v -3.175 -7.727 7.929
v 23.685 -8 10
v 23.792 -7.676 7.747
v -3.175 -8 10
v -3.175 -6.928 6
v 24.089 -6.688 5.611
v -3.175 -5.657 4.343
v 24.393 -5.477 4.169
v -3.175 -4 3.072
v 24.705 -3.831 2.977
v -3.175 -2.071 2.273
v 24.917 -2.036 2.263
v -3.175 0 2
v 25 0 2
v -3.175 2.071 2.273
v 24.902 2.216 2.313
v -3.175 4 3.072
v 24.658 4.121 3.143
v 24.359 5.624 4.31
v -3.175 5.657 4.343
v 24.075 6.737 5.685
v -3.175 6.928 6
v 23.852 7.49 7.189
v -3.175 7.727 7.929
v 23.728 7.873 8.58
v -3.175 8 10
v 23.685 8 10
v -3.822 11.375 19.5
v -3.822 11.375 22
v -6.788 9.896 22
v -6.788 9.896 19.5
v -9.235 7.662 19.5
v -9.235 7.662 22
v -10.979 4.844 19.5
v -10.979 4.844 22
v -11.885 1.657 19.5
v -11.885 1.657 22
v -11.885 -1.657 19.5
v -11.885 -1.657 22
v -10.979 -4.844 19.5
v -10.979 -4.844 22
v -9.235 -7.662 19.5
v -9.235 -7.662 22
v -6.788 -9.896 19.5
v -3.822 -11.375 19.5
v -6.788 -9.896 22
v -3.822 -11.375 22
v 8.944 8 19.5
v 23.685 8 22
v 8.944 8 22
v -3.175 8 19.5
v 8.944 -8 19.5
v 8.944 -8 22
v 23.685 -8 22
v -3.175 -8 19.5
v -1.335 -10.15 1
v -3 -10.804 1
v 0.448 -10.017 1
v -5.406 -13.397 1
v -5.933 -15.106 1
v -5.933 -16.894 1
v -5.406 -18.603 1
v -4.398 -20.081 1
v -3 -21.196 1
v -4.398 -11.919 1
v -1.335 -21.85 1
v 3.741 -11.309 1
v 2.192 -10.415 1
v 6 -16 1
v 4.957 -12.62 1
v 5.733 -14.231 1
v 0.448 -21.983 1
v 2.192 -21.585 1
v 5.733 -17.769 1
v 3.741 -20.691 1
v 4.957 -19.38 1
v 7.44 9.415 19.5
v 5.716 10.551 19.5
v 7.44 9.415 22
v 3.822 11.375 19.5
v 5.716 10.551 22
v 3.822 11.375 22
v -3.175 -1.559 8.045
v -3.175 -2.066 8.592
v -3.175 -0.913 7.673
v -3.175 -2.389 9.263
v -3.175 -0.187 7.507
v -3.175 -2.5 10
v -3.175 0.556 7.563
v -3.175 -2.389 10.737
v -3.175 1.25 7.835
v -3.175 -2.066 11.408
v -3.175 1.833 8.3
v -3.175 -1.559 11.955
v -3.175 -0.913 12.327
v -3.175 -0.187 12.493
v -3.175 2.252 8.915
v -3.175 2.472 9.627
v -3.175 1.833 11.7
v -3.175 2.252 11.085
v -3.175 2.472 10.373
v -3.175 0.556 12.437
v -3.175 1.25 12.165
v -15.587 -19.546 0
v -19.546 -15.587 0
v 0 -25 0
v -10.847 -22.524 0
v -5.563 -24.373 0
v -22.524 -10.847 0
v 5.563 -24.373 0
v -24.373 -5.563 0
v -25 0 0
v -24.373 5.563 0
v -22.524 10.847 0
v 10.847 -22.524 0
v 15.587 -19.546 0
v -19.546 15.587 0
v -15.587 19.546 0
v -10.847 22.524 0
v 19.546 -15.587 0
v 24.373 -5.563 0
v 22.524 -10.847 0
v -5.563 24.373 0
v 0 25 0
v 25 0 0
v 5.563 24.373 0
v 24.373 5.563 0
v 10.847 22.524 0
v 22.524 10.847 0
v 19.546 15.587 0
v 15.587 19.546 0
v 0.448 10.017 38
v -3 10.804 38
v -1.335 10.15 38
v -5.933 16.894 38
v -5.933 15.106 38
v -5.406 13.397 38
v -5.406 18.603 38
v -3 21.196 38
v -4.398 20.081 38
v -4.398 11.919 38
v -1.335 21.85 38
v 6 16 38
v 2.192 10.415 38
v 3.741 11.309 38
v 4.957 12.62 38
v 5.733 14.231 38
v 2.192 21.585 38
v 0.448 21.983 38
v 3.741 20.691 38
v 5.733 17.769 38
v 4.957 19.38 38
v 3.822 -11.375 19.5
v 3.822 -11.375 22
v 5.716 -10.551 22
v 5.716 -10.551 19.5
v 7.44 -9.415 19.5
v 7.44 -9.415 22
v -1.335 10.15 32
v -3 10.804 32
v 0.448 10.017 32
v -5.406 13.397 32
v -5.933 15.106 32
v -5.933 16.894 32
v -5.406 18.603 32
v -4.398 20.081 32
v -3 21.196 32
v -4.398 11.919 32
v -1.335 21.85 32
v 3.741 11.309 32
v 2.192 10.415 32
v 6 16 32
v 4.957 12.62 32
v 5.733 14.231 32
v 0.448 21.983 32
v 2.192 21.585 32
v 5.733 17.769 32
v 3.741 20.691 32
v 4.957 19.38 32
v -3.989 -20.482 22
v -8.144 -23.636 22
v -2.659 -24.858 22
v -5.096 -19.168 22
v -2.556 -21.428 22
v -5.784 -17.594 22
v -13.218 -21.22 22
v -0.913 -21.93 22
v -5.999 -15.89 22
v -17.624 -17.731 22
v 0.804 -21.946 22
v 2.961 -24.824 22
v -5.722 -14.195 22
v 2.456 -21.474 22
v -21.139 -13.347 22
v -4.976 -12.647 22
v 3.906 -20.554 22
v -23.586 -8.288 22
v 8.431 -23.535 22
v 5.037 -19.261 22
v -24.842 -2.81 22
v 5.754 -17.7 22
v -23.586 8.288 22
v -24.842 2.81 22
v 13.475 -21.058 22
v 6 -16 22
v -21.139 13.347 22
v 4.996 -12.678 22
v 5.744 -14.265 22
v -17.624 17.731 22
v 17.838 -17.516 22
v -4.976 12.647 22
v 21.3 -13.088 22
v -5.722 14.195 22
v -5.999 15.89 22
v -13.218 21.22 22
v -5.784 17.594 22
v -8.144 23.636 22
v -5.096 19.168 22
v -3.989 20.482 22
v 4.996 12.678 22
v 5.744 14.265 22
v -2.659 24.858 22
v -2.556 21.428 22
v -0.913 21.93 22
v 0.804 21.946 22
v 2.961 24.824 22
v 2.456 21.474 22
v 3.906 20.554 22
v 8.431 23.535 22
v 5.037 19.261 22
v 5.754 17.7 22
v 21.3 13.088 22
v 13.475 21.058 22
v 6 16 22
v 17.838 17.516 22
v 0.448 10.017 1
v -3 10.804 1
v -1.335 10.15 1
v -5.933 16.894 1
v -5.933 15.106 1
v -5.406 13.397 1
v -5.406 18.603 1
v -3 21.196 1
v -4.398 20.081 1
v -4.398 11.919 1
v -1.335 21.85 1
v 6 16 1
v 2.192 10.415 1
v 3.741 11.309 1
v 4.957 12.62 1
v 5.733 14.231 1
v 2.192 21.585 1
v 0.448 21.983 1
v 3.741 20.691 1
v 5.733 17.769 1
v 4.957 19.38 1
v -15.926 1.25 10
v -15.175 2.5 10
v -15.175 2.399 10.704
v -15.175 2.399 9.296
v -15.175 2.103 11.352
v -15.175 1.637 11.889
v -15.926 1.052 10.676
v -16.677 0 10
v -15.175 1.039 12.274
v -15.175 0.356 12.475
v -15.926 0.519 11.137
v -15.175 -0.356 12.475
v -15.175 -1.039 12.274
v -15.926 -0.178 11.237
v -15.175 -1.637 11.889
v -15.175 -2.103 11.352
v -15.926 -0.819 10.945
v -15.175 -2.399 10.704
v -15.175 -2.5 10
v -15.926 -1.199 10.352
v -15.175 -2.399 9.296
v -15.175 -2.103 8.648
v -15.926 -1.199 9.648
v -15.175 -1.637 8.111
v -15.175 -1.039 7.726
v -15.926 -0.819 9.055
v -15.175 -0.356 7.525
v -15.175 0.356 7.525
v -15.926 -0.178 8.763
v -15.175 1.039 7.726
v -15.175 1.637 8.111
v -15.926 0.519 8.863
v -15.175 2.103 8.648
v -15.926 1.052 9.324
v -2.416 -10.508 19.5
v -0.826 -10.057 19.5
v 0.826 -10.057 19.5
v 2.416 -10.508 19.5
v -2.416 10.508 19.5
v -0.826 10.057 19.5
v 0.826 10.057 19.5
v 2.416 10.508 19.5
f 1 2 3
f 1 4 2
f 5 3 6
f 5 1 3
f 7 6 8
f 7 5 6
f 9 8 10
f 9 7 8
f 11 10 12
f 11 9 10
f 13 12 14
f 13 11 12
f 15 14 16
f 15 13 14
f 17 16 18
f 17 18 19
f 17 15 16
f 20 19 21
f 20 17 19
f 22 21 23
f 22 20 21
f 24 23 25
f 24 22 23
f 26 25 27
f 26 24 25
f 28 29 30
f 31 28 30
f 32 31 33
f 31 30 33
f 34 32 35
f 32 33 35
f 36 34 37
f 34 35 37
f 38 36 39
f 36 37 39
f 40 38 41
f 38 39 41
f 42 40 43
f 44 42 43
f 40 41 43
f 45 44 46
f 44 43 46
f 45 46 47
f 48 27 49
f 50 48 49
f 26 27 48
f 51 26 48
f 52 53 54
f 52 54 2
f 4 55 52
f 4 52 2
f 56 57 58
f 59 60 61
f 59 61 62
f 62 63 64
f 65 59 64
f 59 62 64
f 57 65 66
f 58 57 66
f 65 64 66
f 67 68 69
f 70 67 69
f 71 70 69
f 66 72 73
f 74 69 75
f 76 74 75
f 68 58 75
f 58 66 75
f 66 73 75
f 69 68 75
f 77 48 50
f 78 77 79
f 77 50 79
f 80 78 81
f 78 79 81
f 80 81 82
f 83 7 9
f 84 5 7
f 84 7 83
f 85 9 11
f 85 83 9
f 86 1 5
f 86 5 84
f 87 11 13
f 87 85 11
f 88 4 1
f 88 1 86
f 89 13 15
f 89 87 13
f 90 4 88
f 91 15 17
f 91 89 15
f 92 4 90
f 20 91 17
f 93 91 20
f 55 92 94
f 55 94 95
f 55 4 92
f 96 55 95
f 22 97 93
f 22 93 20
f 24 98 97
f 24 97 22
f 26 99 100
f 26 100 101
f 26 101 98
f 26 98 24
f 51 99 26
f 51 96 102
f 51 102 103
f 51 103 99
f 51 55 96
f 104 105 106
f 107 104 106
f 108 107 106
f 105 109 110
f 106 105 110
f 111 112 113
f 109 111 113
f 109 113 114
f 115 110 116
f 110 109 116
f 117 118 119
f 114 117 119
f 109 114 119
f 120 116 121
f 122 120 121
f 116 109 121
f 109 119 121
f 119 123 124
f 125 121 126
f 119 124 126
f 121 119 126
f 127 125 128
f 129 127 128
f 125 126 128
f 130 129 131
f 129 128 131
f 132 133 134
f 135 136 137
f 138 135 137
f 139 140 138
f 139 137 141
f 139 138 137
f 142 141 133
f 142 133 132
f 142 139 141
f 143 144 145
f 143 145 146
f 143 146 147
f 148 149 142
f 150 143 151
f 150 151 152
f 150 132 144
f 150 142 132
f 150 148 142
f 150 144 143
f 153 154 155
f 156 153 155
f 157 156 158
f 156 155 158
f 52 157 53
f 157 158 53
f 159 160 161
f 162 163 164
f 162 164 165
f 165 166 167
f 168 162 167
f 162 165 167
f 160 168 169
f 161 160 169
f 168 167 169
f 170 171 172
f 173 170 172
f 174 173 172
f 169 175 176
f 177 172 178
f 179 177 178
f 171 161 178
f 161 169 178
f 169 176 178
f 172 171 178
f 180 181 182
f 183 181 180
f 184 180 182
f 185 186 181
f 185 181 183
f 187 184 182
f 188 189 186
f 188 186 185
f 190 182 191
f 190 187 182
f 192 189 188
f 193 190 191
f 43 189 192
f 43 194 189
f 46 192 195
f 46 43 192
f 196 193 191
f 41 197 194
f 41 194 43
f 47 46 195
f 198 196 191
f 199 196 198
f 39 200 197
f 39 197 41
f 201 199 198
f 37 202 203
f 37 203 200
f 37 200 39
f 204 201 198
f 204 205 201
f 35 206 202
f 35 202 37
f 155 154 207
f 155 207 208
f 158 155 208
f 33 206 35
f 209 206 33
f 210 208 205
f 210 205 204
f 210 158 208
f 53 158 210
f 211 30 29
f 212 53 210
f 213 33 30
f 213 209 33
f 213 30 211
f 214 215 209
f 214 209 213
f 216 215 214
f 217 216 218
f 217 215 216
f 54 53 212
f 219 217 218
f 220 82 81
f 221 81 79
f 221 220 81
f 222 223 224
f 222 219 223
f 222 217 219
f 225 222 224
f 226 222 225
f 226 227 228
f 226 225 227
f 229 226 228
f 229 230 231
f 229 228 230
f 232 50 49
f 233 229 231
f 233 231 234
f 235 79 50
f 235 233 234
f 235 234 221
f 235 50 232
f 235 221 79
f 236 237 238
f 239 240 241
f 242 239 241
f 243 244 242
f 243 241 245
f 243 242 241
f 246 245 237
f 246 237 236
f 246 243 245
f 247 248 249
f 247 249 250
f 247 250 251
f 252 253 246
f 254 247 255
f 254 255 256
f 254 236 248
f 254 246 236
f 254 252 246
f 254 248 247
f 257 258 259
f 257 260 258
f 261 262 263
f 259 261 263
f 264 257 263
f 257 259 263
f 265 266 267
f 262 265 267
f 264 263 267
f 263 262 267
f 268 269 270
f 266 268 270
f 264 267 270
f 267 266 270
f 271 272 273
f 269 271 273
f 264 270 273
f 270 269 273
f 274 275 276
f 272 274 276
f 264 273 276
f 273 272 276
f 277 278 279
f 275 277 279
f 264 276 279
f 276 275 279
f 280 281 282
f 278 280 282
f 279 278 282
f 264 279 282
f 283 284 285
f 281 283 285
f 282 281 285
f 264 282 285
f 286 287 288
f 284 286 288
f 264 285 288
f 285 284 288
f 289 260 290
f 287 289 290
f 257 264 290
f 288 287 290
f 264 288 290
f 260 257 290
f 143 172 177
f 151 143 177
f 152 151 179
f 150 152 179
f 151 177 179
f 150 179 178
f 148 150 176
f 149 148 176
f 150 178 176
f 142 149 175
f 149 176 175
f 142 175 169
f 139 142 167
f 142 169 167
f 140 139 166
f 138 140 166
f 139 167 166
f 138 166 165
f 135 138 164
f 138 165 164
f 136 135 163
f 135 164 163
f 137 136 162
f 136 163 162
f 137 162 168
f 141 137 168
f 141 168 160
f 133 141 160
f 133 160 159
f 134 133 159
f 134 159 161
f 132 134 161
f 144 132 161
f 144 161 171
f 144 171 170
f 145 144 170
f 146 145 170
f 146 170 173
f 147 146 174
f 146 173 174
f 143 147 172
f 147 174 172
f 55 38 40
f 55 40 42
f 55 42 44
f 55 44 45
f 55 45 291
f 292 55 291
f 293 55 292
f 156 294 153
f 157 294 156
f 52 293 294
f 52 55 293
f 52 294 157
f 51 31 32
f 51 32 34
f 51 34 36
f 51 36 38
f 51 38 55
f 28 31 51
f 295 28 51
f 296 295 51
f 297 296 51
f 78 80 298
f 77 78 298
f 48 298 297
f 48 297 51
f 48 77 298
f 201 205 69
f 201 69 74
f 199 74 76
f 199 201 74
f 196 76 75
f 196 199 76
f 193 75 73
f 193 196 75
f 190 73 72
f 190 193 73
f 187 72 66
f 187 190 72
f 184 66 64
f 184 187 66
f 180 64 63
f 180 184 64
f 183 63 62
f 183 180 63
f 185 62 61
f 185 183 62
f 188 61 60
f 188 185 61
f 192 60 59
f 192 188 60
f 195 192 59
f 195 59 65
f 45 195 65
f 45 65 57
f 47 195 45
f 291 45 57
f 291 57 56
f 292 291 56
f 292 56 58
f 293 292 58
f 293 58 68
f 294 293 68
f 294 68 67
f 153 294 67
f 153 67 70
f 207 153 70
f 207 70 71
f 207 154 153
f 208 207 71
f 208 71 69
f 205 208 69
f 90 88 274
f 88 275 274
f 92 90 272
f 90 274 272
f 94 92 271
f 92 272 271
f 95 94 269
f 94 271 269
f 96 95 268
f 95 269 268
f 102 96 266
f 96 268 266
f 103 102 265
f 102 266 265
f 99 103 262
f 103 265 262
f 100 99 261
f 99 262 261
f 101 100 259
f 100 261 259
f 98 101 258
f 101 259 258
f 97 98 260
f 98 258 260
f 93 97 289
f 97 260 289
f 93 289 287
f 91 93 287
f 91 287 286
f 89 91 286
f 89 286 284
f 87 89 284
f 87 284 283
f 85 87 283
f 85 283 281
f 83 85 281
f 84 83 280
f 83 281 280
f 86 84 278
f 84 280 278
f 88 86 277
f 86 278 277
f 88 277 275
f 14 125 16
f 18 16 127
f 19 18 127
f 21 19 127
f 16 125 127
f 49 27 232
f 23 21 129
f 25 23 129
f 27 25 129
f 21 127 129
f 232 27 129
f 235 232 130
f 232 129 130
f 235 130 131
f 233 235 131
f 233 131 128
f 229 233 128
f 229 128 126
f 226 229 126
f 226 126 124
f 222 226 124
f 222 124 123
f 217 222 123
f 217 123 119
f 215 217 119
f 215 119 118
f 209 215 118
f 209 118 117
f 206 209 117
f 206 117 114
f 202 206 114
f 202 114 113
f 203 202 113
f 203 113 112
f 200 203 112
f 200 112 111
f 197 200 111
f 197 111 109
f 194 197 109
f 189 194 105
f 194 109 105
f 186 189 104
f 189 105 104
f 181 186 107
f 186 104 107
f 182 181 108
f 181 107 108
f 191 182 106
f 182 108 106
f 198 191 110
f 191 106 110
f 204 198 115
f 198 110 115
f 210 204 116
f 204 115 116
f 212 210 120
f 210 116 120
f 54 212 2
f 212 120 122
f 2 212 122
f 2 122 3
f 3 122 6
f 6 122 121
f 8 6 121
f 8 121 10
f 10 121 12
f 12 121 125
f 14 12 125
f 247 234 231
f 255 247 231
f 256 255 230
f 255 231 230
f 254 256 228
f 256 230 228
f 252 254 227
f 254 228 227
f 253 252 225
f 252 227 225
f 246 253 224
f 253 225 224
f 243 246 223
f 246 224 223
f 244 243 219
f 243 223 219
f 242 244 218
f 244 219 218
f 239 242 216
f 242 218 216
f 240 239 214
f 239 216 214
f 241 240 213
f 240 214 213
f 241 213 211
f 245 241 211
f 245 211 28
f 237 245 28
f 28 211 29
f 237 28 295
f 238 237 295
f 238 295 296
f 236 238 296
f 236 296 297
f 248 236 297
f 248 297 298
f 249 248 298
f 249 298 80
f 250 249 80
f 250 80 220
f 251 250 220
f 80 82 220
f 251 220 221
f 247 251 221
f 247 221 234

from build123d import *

# Parameters (mm, degrees)
F0_R          = 25
F1_DEPTH      = 22
F4_DEPTH      = 26.0000001
F4_DEPTH_BACK = 3.175
F5_R          = 6
F6_DEPTH      = 21
F8_D          = 5
F8_DEPTH      = 12
F8_TIP        = 1.5021515476
F9_R          = 12
F10_DEPTH     = 2.5
F12_R         = 6
F13_DEPTH     = 6


# Not quite as in the source:
# - a length typed as a fraction of an inch, garbled in the dataset ("3 / 203.2 mm" for 3/8 in), is restored
# - a pattern or mirror of a feature is missing from the dataset's text; its kind, count and spacing are read off the source's solid


with BuildPart() as f1:
    # F0 (on Top) → F1 (new body)
    with BuildSketch(Plane.XY):
        Circle(F0_R)
    extrude(amount=F1_DEPTH)

    # F3 (on Right) → F4 (cut, two sides)
    with BuildSketch(Plane.YZ) as f4_sk:
        with BuildLine():
            Line((8, 10), (8, 42))
            Line((8, 42), (-8, 42))
            Line((-8, 42), (-8, 10))
            ThreePointArc((-8, 10), (-5.6568542495, 4.3431457505), (0, 2))
            ThreePointArc((0, 2), (5.6568542495, 4.3431457505), (8, 10))
        make_face()
    extrude(amount=F4_DEPTH, mode=Mode.SUBTRACT)
    extrude(f4_sk.sketch, amount=-F4_DEPTH_BACK, mode=Mode.SUBTRACT)

    # F5 (on face) → F6 (cut)
    with BuildSketch(Plane.XY.offset(22)):
        with Locations((0, 16)):
            Circle(F5_R)
    f6 = extrude(amount=-F6_DEPTH, mode=Mode.SUBTRACT)

    # F6_copies: F6 across plane
    add(f6.mirror(Plane(origin=(0, 0, 0), x_dir=(0, 0, -1), z_dir=(0, -1, 0))), mode=Mode.SUBTRACT)

    # F8
    with Locations(Plane.YZ.offset(-3.175)):
        with Locations((0, 10)):
            Hole(F8_D / 2, depth=F8_DEPTH)
            with Locations((0, 0, -(F8_DEPTH + F8_TIP / 2))):  # 118° drill point
                Cone(0, F8_D / 2, F8_TIP, mode=Mode.SUBTRACT)

    # F9 (on face) → F10 (cut)
    with BuildSketch(Plane.XY.offset(22)):
        Circle(F9_R)
    extrude(amount=-F10_DEPTH, mode=Mode.SUBTRACT)


with BuildPart() as f13:
    # F12 (on offset) → F13 (new body)
    with BuildSketch(Plane.XY.offset(32)):
        with Locations((0, 16)):
            Circle(F12_R)
    extrude(amount=F13_DEPTH)


solid = Compound([f1.part, f13.part])
